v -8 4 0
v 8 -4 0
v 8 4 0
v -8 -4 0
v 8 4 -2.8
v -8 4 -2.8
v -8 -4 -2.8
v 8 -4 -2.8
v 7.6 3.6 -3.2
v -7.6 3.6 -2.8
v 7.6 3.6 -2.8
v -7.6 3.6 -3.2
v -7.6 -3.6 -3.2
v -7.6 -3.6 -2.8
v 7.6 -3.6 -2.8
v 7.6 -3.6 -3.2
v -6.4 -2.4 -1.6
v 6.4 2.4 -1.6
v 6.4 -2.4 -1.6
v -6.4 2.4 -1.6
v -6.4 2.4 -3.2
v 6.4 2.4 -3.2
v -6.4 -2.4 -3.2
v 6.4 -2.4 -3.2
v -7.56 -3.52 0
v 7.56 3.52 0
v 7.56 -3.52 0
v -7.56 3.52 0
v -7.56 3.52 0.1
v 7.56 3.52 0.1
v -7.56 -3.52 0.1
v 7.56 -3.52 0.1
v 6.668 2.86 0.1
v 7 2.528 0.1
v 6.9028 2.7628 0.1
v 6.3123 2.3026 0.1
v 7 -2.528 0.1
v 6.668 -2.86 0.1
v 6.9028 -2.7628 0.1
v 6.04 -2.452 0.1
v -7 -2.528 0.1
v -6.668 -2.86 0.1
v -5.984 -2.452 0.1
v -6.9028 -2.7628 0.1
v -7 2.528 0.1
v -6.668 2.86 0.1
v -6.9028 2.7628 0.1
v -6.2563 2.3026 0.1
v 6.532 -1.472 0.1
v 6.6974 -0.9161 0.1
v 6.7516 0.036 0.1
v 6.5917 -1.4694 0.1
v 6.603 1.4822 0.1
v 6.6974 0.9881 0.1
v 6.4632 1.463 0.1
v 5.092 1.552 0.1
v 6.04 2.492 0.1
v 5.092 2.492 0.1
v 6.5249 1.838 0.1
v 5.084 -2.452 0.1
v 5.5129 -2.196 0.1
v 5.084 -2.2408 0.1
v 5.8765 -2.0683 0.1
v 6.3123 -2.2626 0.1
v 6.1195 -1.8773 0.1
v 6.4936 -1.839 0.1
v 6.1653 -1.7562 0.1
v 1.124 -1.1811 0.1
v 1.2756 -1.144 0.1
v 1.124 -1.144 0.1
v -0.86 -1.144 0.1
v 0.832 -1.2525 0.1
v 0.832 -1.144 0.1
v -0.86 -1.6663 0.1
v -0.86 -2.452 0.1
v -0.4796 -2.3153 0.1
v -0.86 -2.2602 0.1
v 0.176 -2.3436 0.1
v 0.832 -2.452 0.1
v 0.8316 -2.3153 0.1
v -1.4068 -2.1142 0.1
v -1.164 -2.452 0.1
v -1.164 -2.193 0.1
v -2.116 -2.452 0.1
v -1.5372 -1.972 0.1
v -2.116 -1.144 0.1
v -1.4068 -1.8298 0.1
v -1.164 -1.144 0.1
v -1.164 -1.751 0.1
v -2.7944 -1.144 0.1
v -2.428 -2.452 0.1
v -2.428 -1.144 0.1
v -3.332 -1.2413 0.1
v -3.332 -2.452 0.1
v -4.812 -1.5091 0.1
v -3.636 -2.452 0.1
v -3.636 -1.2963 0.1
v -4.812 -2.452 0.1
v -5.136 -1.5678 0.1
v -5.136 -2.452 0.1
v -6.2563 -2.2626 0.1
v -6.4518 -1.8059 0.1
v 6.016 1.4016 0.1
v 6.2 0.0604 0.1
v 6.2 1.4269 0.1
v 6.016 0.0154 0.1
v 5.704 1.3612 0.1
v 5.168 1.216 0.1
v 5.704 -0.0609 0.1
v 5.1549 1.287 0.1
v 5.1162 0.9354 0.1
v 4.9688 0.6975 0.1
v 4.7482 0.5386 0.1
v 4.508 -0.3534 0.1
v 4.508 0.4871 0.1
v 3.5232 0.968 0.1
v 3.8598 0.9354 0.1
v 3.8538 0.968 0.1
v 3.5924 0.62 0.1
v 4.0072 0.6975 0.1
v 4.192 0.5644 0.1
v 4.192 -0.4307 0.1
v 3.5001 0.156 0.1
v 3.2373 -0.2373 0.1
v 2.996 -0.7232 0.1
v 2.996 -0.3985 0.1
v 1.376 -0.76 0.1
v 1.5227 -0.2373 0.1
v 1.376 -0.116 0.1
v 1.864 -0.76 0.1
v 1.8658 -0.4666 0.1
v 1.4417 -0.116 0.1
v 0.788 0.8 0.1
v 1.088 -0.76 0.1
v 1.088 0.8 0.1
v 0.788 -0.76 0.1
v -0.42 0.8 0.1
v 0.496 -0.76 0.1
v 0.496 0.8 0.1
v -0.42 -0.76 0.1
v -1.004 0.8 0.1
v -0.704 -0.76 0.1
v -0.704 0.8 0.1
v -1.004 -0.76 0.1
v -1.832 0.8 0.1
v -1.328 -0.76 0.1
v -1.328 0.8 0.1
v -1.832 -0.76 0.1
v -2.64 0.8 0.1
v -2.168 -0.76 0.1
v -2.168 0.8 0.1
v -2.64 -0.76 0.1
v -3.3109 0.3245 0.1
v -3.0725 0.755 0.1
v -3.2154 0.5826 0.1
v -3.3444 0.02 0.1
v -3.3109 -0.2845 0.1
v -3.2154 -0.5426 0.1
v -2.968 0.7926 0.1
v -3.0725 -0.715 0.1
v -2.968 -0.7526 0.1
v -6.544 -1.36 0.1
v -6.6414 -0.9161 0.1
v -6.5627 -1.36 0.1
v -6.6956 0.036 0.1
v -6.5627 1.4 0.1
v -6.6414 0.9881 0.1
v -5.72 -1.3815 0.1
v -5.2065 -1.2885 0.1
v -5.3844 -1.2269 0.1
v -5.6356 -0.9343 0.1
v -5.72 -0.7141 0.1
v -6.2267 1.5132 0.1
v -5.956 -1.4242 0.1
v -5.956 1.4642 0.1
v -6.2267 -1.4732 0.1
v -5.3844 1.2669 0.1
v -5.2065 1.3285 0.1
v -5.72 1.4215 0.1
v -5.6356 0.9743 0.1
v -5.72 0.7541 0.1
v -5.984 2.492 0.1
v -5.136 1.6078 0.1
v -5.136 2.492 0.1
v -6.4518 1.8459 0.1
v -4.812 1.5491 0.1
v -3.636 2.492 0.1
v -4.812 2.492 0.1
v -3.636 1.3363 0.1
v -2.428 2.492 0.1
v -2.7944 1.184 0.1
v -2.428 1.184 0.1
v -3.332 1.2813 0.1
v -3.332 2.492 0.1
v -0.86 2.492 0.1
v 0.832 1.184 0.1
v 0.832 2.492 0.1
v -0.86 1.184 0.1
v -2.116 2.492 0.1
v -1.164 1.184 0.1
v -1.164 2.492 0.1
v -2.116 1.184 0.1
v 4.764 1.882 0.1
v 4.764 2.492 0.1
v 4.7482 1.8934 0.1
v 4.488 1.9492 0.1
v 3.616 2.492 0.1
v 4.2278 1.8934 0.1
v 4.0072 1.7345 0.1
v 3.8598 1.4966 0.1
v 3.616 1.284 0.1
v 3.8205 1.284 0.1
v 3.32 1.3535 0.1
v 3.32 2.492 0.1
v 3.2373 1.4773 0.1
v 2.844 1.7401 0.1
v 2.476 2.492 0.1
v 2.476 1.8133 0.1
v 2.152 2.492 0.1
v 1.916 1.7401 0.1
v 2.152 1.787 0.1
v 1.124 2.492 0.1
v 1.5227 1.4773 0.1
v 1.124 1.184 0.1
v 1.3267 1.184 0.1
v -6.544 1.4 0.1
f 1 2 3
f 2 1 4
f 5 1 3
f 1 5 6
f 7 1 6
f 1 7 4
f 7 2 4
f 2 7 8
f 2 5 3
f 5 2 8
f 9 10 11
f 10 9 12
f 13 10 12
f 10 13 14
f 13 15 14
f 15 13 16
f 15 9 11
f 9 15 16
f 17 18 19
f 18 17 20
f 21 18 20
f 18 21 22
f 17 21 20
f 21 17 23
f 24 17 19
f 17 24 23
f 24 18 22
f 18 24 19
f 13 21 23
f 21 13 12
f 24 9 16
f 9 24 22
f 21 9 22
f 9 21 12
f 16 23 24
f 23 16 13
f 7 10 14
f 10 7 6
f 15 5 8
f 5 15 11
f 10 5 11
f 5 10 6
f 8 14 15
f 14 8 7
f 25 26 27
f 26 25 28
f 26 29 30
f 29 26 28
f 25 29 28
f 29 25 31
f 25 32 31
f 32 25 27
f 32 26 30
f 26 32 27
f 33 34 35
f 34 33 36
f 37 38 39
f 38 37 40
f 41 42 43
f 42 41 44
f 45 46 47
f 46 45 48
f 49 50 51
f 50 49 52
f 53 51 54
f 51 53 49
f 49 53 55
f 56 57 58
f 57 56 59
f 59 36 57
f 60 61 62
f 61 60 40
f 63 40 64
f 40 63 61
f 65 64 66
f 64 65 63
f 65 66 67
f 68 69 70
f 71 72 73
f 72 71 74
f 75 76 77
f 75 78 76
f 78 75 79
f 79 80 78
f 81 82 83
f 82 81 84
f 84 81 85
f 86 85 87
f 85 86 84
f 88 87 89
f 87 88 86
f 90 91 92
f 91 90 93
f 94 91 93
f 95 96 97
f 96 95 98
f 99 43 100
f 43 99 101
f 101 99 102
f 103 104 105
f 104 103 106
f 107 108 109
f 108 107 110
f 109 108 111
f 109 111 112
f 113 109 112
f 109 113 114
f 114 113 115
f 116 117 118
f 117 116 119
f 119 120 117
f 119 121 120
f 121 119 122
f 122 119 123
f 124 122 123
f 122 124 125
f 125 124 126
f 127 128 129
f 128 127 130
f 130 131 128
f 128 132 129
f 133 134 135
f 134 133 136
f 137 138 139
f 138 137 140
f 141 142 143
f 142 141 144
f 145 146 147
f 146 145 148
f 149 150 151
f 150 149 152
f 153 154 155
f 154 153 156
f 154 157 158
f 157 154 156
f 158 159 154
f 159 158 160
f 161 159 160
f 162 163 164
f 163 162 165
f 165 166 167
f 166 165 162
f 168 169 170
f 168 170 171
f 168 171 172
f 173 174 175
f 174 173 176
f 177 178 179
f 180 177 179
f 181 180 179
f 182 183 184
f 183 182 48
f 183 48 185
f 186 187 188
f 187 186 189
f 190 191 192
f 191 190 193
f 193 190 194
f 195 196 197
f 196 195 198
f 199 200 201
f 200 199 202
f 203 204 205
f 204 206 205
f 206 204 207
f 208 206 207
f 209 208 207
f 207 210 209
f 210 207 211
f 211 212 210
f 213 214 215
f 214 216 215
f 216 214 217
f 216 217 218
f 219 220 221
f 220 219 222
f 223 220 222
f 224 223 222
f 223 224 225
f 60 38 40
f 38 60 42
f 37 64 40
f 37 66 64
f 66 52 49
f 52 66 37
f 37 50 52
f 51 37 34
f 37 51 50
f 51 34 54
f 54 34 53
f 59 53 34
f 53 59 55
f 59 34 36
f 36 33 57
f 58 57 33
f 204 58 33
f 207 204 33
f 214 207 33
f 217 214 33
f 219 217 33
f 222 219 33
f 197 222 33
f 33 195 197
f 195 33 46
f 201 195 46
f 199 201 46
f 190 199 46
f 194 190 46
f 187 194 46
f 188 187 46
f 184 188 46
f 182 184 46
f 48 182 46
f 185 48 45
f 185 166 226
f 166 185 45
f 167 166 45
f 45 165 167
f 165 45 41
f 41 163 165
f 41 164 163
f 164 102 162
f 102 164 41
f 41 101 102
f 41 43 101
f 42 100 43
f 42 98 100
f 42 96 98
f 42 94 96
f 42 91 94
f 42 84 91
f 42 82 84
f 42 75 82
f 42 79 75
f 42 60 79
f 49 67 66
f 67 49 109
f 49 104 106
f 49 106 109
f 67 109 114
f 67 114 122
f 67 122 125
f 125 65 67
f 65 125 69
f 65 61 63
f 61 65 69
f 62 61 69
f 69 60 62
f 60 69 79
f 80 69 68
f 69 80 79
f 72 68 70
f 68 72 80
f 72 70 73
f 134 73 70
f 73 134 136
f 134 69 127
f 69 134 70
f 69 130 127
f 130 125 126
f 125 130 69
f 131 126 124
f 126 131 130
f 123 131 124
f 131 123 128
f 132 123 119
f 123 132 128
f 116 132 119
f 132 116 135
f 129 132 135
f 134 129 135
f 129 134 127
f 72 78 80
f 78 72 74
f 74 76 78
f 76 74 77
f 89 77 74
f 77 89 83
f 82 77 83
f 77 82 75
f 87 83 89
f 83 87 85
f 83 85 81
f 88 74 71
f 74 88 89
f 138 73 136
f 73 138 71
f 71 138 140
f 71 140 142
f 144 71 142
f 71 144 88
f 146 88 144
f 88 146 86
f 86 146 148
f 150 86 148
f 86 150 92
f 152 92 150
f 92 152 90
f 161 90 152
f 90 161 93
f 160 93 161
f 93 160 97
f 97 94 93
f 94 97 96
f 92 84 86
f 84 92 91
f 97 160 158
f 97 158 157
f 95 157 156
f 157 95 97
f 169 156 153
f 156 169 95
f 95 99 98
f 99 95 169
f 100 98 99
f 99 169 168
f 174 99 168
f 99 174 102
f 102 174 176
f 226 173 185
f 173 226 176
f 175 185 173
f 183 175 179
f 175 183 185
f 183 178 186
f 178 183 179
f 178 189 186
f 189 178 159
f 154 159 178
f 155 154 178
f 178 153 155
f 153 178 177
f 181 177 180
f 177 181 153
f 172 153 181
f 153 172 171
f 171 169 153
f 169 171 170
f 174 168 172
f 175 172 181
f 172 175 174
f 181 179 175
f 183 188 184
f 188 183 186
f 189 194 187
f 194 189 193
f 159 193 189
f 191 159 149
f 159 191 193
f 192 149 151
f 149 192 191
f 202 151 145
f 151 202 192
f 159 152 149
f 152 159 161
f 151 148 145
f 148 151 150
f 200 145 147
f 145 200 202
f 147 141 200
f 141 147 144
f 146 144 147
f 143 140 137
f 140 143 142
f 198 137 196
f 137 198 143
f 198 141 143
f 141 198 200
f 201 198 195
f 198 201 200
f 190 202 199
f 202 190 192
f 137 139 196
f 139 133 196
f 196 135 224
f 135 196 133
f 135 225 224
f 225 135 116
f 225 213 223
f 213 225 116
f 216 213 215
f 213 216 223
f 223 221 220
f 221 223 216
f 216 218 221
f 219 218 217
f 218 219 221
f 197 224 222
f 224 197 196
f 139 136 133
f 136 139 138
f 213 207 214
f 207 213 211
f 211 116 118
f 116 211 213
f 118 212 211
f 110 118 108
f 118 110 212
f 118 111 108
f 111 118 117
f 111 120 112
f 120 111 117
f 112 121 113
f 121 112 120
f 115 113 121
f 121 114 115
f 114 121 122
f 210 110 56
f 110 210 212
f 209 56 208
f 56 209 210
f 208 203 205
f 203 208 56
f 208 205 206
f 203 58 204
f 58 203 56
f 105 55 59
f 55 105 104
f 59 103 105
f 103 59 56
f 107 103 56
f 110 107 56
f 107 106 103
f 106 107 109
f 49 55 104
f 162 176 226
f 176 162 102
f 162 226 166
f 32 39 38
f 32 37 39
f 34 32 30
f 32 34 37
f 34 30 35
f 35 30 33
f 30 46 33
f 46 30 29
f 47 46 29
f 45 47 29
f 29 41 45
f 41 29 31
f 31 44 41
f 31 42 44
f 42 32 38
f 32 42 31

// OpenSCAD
// file: ../p/box5.scad
use <../lib.scad>
function ldraw_lib__box5() = [
// 0 Box with 5 Faces and All Edges
// 0 Name: box5.dat
// 0 Author: James Jessiman
// 0 !LDRAW_ORG Primitive UPDATE 2012-01
// 0 !LICENSE Licensed under CC BY 4.0 : see CAreadme.txt
// 
// 0 BFC CERTIFY CCW
  [0,"BFC","CERTIFY"],
  [0,"BFC","CCW"],
// 
// 0 !HISTORY 2002-04-03 [sbliss] Modified for BFC compliance
// 0 !HISTORY 2002-04-25 [PTadmin] Official Update 2002-02
// 0 !HISTORY 2007-06-24 [PTadmin] Header formatted for Contributor Agreement
// 0 !HISTORY 2008-07-01 [PTadmin] Official Update 2008-01
// 0 !HISTORY 2012-02-16 [Philo] Changed to CCW
// 0 !HISTORY 2012-03-30 [PTadmin] Official Update 2012-01
// 
// 
// 2 24 1 1 1 -1 1 1
  [2,24,1,1,1,-1,1,1],
// 2 24 -1 1 1 -1 1 -1
  [2,24,-1,1,1,-1,1,-1],
// 2 24 -1 1 -1 1 1 -1
  [2,24,-1,1,-1,1,1,-1],
// 2 24 1 1 -1 1 1 1
  [2,24,1,1,-1,1,1,1],
// 2 24 1 0 1 -1 0 1
  [2,24,1,0,1,-1,0,1],
// 2 24 -1 0 1 -1 0 -1
  [2,24,-1,0,1,-1,0,-1],
// 2 24 -1 0 -1 1 0 -1
  [2,24,-1,0,-1,1,0,-1],
// 2 24 1 0 -1 1 0 1
  [2,24,1,0,-1,1,0,1],
// 2 24 1 0 1 1 1 1
  [2,24,1,0,1,1,1,1],
// 2 24 -1 0 1 -1 1 1
  [2,24,-1,0,1,-1,1,1],
// 2 24 1 0 -1 1 1 -1
  [2,24,1,0,-1,1,1,-1],
// 2 24 -1 0 -1 -1 1 -1
  [2,24,-1,0,-1,-1,1,-1],
// 4 16 -1 1 1 1 1 1 1 1 -1 -1 1 -1
  [4,16,-1,1,1,1,1,1,1,1,-1,-1,1,-1],
// 4 16 -1 1 1 -1 0 1 1 0 1 1 1 1
  [4,16,-1,1,1,-1,0,1,1,0,1,1,1,1],
// 4 16 -1 1 -1 -1 0 -1 -1 0 1 -1 1 1
  [4,16,-1,1,-1,-1,0,-1,-1,0,1,-1,1,1],
// 4 16 1 1 -1 1 0 -1 -1 0 -1 -1 1 -1
  [4,16,1,1,-1,1,0,-1,-1,0,-1,-1,1,-1],
// 4 16 1 1 1 1 0 1 1 0 -1 1 1 -1
  [4,16,1,1,1,1,0,1,1,0,-1,1,1,-1],
];
module ldraw_lib__box5(step=0, col=false, unit=2/5, alt=false, line=0.2, solid=!$preview)
    makepoly(ldraw_lib__box5(), step=step, col=col, unit=unit, alt=alt, line=line, solid=solid);
ldraw_lib__box5(line=0.2);
// file: ../p/box4.scad
use <../lib.scad>
function ldraw_lib__box4() = [
// 0 Box with 4 Faces (2 Parallel Pairs) and All Edges
// 0 Name: box4.dat
// 0 Author: James Jessiman
// 0 !LDRAW_ORG Primitive UPDATE 2012-01
// 0 !LICENSE Licensed under CC BY 4.0 : see CAreadme.txt
// 
// 0 BFC CERTIFY CCW
  [0,"BFC","CERTIFY"],
  [0,"BFC","CCW"],
// 
// 0 !HISTORY 2002-04-03 [sbliss] Modified for BFC compliance
// 0 !HISTORY 2002-04-25 [PTadmin] Official Update 2002-02
// 0 !HISTORY 2007-06-24 [PTadmin] Header formatted for Contributor Agreement
// 0 !HISTORY 2008-07-01 [PTadmin] Official Update 2008-01
// 0 !HISTORY 2012-02-16 [Philo] Changed to CCW
// 0 !HISTORY 2012-03-30 [PTadmin] Official Update 2012-01
// 
// 
// 2 24 1 1 1 -1 1 1
  [2,24,1,1,1,-1,1,1],
// 2 24 -1 1 1 -1 1 -1
  [2,24,-1,1,1,-1,1,-1],
// 2 24 -1 1 -1 1 1 -1
  [2,24,-1,1,-1,1,1,-1],
// 2 24 1 1 -1 1 1 1
  [2,24,1,1,-1,1,1,1],
// 2 24 1 0 1 -1 0 1
  [2,24,1,0,1,-1,0,1],
// 2 24 -1 0 1 -1 0 -1
  [2,24,-1,0,1,-1,0,-1],
// 2 24 -1 0 -1 1 0 -1
  [2,24,-1,0,-1,1,0,-1],
// 2 24 1 0 -1 1 0 1
  [2,24,1,0,-1,1,0,1],
// 2 24 1 0 1 1 1 1
  [2,24,1,0,1,1,1,1],
// 2 24 -1 0 1 -1 1 1
  [2,24,-1,0,1,-1,1,1],
// 2 24 1 0 -1 1 1 -1
  [2,24,1,0,-1,1,1,-1],
// 2 24 -1 0 -1 -1 1 -1
  [2,24,-1,0,-1,-1,1,-1],
// 4 16 -1 1 1 -1 0 1 1 0 1 1 1 1
  [4,16,-1,1,1,-1,0,1,1,0,1,1,1,1],
// 4 16 -1 1 -1 -1 0 -1 -1 0 1 -1 1 1
  [4,16,-1,1,-1,-1,0,-1,-1,0,1,-1,1,1],
// 4 16 1 1 -1 1 0 -1 -1 0 -1 -1 1 -1
  [4,16,1,1,-1,1,0,-1,-1,0,-1,-1,1,-1],
// 4 16 1 1 1 1 0 1 1 0 -1 1 1 -1
  [4,16,1,1,1,1,0,1,1,0,-1,1,1,-1],
];
module ldraw_lib__box4(step=0, col=false, unit=2/5, alt=false, line=0.2, solid=!$preview)
    makepoly(ldraw_lib__box4(), step=step, col=col, unit=unit, alt=alt, line=line, solid=solid);
ldraw_lib__box4(line=0.2);
// file: s/3069bs01.scad
use <../../lib.scad>
use <../../p/box4.scad>
use <../../p/box5.scad>
function ldraw_lib__s__3069bs01() = [
// 0 ~Tile  1 x  2 with Groove without Top Face
// 0 Name: s\3069bs01.dat
// 0 Author: Santeri Piippo [arezey]
// 0 !LDRAW_ORG Subpart UPDATE 2010-02
// 0 !LICENSE Licensed under CC BY 4.0 : see CAreadme.txt
// 
// 0 BFC CERTIFY CCW
  [0,"BFC","CERTIFY"],
  [0,"BFC","CCW"],
// 
// 0 !HISTORY 2010-07-05 [PTadmin] Official Update 2010-02
// 
// 
// 1 16 0 0 0 20 0 0 0 7 0 0 0 10 box4.dat
  [1,16,0,0,0,20,0,0,0,7,0,0,0,10, ldraw_lib__box4()],
// 1 16 0 7 0 19 0 0 0 1 0 0 0 9 box4.dat
  [1,16,0,7,0,19,0,0,0,1,0,0,0,9, ldraw_lib__box4()],
// 0 BFC INVERTNEXT
  [0,"BFC","INVERTNEXT"],
// 1 16 0 8 0 16 0 0 0 -4 0 0 0 6 box5.dat
  [1,16,0,8,0,16,0,0,0,-4,0,0,0,6, ldraw_lib__box5()],
// 4 16 -19 8 9 -16 8 6 -16 8 -6 -19 8 -9
  [4,16,-19,8,9,-16,8,6,-16,8,-6,-19,8,-9],
// 4 16 19 8 -9 16 8 -6 16 8 6 19 8 9
  [4,16,19,8,-9,16,8,-6,16,8,6,19,8,9],
// 4 16 19 8 9 16 8 6 -16 8 6 -19 8 9
  [4,16,19,8,9,16,8,6,-16,8,6,-19,8,9],
// 4 16 -19 8 -9 -16 8 -6 16 8 -6 19 8 -9
  [4,16,-19,8,-9,-16,8,-6,16,8,-6,19,8,-9],
// 4 16 -20 7 10 -19 7 9 -19 7 -9 -20 7 -10
  [4,16,-20,7,10,-19,7,9,-19,7,-9,-20,7,-10],
// 4 16 20 7 -10 19 7 -9 19 7 9 20 7 10
  [4,16,20,7,-10,19,7,-9,19,7,9,20,7,10],
// 4 16 20 7 10 19 7 9 -19 7 9 -20 7 10
  [4,16,20,7,10,19,7,9,-19,7,9,-20,7,10],
// 4 16 -20 7 -10 -19 7 -9 19 7 -9 20 7 -10
  [4,16,-20,7,-10,-19,7,-9,19,7,-9,20,7,-10],
// 0 //
];
module ldraw_lib__s__3069bs01(step=0, col=false, unit=2/5, alt=false, line=0.2, solid=!$preview)
    makepoly(ldraw_lib__s__3069bs01(), step=step, col=col, unit=unit, alt=alt, line=line, solid=solid);
ldraw_lib__s__3069bs01(line=0.2);
// file: ../p/box5-12.scad
use <../lib.scad>
function ldraw_lib__box5_12() = [
// 0 Box with 5 Faces without Any Edges
// 0 Name: box5-12.dat
// 0 Author: Chris Dee [cwdee]
// 0 !LDRAW_ORG Primitive UPDATE 2009-02
// 0 !LICENSE Licensed under CC BY 4.0 : see CAreadme.txt
// 
// 0 BFC CERTIFY CCW
  [0,"BFC","CERTIFY"],
  [0,"BFC","CCW"],
// 
// 0 !HISTORY 2009-09-03 [PTadmin] Official Update 2009-02
// 
// 
// 4 16 1 1 1 1 1 -1 -1 1 -1 -1 1 1
  [4,16,1,1,1,1,1,-1,-1,1,-1,-1,1,1],
// 4 16 -1 0 1 1 0 1 1 1 1 -1 1 1
  [4,16,-1,0,1,1,0,1,1,1,1,-1,1,1],
// 4 16 -1 0 -1 -1 0 1 -1 1 1 -1 1 -1
  [4,16,-1,0,-1,-1,0,1,-1,1,1,-1,1,-1],
// 4 16 1 0 -1 -1 0 -1 -1 1 -1 1 1 -1
  [4,16,1,0,-1,-1,0,-1,-1,1,-1,1,1,-1],
// 4 16 1 0 1 1 0 -1 1 1 -1 1 1 1
  [4,16,1,0,1,1,0,-1,1,1,-1,1,1,1],
// 0
];
module ldraw_lib__box5_12(step=0, col=false, unit=2/5, alt=false, line=0.2, solid=!$preview)
    makepoly(ldraw_lib__box5_12(), step=step, col=col, unit=unit, alt=alt, line=line, solid=solid);
ldraw_lib__box5_12(line=0.2);
// file: 3069b.scad
use <../lib.scad>
use <s/3069bs01.scad>
function ldraw_lib__3069b() = [
// 0 Tile  1 x  2 with Groove
// 0 Name: 3069b.dat
// 0 Author: Santeri Piippo [arezey]
// 0 !LDRAW_ORG Part UPDATE 2010-02
// 0 !LICENSE Licensed under CC BY 4.0 : see CAreadme.txt
// 
// 0 BFC CERTIFY CCW
  [0,"BFC","CERTIFY"],
  [0,"BFC","CCW"],
// 
// 0 !HISTORY 2010-07-05 [PTadmin] Official Update 2010-02
// 
// 
// 4 16 20 0 -10 20 0 10 -20 0 10 -20 0 -10
  [4,16,20,0,-10,20,0,10,-20,0,10,-20,0,-10],
// 1 16 0 0 0 1 0 0 0 1 0 0 0 1 s\3069bs01.dat
  [1,16,0,0,0,1,0,0,0,1,0,0,0,1, ldraw_lib__s__3069bs01()],
// 0 //
];
module ldraw_lib__3069b(step=0, col=false, unit=2/5, alt=false, line=0.2, solid=!$preview)
    makepoly(ldraw_lib__3069b(), step=step, col=col, unit=unit, alt=alt, line=line, solid=solid);
ldraw_lib__3069b(line=0.2);
// main file
use <../lib.scad>
use <168365c.scad>
use <3069b.scad>
function ldraw_lib__3069bd1d() = [
// 0 Tile  1 x  2 with Black and Light Grey Stripes on White Background with Reflection Areas with Black Border Sticker
// 0 Name: 3069bd1d.dat
// 0 Author: Chris Böhnke [KnightOfTarenta]
// 0 !LDRAW_ORG Shortcut UPDATE 2025-02
// 0 !LICENSE Licensed under CC BY 4.0 : see CAreadme.txt
// 
// 0 BFC CERTIFY CCW
  [0,"BFC","CERTIFY"],
  [0,"BFC","CCW"],
// 
// 0 !CATEGORY Sticker Shortcut
// 0 !KEYWORDS Bricklink 3069pb0057, BrickOwl 540860, headlight, Rebel Wrecker
// 0 !KEYWORDS Set 8858, Technic
// 
// 0 !HISTORY 2025-02-27 [OrionP] Official Update 2025-02
// 
// 1 16 0 0 0 1 0 0 0 1 0 0 0 1 3069b.dat
  [1,16,0,0,0,1,0,0,0,1,0,0,0,1, ldraw_lib__3069b()],
// 1 16 0 0 0 1 0 0 0 1 0 0 0 1 168365c.dat
  [1,16,0,0,0,1,0,0,0,1,0,0,0,1, ldraw_lib__168365c()],
];
module ldraw_lib__3069bd1d(step=0, col=false, unit=2/5, alt=false, line=0.2, solid=!$preview)
    makepoly(ldraw_lib__3069bd1d(), step=step, col=col, unit=unit, alt=alt, line=line, solid=solid);
ldraw_lib__3069bd1d(line=0.2);
